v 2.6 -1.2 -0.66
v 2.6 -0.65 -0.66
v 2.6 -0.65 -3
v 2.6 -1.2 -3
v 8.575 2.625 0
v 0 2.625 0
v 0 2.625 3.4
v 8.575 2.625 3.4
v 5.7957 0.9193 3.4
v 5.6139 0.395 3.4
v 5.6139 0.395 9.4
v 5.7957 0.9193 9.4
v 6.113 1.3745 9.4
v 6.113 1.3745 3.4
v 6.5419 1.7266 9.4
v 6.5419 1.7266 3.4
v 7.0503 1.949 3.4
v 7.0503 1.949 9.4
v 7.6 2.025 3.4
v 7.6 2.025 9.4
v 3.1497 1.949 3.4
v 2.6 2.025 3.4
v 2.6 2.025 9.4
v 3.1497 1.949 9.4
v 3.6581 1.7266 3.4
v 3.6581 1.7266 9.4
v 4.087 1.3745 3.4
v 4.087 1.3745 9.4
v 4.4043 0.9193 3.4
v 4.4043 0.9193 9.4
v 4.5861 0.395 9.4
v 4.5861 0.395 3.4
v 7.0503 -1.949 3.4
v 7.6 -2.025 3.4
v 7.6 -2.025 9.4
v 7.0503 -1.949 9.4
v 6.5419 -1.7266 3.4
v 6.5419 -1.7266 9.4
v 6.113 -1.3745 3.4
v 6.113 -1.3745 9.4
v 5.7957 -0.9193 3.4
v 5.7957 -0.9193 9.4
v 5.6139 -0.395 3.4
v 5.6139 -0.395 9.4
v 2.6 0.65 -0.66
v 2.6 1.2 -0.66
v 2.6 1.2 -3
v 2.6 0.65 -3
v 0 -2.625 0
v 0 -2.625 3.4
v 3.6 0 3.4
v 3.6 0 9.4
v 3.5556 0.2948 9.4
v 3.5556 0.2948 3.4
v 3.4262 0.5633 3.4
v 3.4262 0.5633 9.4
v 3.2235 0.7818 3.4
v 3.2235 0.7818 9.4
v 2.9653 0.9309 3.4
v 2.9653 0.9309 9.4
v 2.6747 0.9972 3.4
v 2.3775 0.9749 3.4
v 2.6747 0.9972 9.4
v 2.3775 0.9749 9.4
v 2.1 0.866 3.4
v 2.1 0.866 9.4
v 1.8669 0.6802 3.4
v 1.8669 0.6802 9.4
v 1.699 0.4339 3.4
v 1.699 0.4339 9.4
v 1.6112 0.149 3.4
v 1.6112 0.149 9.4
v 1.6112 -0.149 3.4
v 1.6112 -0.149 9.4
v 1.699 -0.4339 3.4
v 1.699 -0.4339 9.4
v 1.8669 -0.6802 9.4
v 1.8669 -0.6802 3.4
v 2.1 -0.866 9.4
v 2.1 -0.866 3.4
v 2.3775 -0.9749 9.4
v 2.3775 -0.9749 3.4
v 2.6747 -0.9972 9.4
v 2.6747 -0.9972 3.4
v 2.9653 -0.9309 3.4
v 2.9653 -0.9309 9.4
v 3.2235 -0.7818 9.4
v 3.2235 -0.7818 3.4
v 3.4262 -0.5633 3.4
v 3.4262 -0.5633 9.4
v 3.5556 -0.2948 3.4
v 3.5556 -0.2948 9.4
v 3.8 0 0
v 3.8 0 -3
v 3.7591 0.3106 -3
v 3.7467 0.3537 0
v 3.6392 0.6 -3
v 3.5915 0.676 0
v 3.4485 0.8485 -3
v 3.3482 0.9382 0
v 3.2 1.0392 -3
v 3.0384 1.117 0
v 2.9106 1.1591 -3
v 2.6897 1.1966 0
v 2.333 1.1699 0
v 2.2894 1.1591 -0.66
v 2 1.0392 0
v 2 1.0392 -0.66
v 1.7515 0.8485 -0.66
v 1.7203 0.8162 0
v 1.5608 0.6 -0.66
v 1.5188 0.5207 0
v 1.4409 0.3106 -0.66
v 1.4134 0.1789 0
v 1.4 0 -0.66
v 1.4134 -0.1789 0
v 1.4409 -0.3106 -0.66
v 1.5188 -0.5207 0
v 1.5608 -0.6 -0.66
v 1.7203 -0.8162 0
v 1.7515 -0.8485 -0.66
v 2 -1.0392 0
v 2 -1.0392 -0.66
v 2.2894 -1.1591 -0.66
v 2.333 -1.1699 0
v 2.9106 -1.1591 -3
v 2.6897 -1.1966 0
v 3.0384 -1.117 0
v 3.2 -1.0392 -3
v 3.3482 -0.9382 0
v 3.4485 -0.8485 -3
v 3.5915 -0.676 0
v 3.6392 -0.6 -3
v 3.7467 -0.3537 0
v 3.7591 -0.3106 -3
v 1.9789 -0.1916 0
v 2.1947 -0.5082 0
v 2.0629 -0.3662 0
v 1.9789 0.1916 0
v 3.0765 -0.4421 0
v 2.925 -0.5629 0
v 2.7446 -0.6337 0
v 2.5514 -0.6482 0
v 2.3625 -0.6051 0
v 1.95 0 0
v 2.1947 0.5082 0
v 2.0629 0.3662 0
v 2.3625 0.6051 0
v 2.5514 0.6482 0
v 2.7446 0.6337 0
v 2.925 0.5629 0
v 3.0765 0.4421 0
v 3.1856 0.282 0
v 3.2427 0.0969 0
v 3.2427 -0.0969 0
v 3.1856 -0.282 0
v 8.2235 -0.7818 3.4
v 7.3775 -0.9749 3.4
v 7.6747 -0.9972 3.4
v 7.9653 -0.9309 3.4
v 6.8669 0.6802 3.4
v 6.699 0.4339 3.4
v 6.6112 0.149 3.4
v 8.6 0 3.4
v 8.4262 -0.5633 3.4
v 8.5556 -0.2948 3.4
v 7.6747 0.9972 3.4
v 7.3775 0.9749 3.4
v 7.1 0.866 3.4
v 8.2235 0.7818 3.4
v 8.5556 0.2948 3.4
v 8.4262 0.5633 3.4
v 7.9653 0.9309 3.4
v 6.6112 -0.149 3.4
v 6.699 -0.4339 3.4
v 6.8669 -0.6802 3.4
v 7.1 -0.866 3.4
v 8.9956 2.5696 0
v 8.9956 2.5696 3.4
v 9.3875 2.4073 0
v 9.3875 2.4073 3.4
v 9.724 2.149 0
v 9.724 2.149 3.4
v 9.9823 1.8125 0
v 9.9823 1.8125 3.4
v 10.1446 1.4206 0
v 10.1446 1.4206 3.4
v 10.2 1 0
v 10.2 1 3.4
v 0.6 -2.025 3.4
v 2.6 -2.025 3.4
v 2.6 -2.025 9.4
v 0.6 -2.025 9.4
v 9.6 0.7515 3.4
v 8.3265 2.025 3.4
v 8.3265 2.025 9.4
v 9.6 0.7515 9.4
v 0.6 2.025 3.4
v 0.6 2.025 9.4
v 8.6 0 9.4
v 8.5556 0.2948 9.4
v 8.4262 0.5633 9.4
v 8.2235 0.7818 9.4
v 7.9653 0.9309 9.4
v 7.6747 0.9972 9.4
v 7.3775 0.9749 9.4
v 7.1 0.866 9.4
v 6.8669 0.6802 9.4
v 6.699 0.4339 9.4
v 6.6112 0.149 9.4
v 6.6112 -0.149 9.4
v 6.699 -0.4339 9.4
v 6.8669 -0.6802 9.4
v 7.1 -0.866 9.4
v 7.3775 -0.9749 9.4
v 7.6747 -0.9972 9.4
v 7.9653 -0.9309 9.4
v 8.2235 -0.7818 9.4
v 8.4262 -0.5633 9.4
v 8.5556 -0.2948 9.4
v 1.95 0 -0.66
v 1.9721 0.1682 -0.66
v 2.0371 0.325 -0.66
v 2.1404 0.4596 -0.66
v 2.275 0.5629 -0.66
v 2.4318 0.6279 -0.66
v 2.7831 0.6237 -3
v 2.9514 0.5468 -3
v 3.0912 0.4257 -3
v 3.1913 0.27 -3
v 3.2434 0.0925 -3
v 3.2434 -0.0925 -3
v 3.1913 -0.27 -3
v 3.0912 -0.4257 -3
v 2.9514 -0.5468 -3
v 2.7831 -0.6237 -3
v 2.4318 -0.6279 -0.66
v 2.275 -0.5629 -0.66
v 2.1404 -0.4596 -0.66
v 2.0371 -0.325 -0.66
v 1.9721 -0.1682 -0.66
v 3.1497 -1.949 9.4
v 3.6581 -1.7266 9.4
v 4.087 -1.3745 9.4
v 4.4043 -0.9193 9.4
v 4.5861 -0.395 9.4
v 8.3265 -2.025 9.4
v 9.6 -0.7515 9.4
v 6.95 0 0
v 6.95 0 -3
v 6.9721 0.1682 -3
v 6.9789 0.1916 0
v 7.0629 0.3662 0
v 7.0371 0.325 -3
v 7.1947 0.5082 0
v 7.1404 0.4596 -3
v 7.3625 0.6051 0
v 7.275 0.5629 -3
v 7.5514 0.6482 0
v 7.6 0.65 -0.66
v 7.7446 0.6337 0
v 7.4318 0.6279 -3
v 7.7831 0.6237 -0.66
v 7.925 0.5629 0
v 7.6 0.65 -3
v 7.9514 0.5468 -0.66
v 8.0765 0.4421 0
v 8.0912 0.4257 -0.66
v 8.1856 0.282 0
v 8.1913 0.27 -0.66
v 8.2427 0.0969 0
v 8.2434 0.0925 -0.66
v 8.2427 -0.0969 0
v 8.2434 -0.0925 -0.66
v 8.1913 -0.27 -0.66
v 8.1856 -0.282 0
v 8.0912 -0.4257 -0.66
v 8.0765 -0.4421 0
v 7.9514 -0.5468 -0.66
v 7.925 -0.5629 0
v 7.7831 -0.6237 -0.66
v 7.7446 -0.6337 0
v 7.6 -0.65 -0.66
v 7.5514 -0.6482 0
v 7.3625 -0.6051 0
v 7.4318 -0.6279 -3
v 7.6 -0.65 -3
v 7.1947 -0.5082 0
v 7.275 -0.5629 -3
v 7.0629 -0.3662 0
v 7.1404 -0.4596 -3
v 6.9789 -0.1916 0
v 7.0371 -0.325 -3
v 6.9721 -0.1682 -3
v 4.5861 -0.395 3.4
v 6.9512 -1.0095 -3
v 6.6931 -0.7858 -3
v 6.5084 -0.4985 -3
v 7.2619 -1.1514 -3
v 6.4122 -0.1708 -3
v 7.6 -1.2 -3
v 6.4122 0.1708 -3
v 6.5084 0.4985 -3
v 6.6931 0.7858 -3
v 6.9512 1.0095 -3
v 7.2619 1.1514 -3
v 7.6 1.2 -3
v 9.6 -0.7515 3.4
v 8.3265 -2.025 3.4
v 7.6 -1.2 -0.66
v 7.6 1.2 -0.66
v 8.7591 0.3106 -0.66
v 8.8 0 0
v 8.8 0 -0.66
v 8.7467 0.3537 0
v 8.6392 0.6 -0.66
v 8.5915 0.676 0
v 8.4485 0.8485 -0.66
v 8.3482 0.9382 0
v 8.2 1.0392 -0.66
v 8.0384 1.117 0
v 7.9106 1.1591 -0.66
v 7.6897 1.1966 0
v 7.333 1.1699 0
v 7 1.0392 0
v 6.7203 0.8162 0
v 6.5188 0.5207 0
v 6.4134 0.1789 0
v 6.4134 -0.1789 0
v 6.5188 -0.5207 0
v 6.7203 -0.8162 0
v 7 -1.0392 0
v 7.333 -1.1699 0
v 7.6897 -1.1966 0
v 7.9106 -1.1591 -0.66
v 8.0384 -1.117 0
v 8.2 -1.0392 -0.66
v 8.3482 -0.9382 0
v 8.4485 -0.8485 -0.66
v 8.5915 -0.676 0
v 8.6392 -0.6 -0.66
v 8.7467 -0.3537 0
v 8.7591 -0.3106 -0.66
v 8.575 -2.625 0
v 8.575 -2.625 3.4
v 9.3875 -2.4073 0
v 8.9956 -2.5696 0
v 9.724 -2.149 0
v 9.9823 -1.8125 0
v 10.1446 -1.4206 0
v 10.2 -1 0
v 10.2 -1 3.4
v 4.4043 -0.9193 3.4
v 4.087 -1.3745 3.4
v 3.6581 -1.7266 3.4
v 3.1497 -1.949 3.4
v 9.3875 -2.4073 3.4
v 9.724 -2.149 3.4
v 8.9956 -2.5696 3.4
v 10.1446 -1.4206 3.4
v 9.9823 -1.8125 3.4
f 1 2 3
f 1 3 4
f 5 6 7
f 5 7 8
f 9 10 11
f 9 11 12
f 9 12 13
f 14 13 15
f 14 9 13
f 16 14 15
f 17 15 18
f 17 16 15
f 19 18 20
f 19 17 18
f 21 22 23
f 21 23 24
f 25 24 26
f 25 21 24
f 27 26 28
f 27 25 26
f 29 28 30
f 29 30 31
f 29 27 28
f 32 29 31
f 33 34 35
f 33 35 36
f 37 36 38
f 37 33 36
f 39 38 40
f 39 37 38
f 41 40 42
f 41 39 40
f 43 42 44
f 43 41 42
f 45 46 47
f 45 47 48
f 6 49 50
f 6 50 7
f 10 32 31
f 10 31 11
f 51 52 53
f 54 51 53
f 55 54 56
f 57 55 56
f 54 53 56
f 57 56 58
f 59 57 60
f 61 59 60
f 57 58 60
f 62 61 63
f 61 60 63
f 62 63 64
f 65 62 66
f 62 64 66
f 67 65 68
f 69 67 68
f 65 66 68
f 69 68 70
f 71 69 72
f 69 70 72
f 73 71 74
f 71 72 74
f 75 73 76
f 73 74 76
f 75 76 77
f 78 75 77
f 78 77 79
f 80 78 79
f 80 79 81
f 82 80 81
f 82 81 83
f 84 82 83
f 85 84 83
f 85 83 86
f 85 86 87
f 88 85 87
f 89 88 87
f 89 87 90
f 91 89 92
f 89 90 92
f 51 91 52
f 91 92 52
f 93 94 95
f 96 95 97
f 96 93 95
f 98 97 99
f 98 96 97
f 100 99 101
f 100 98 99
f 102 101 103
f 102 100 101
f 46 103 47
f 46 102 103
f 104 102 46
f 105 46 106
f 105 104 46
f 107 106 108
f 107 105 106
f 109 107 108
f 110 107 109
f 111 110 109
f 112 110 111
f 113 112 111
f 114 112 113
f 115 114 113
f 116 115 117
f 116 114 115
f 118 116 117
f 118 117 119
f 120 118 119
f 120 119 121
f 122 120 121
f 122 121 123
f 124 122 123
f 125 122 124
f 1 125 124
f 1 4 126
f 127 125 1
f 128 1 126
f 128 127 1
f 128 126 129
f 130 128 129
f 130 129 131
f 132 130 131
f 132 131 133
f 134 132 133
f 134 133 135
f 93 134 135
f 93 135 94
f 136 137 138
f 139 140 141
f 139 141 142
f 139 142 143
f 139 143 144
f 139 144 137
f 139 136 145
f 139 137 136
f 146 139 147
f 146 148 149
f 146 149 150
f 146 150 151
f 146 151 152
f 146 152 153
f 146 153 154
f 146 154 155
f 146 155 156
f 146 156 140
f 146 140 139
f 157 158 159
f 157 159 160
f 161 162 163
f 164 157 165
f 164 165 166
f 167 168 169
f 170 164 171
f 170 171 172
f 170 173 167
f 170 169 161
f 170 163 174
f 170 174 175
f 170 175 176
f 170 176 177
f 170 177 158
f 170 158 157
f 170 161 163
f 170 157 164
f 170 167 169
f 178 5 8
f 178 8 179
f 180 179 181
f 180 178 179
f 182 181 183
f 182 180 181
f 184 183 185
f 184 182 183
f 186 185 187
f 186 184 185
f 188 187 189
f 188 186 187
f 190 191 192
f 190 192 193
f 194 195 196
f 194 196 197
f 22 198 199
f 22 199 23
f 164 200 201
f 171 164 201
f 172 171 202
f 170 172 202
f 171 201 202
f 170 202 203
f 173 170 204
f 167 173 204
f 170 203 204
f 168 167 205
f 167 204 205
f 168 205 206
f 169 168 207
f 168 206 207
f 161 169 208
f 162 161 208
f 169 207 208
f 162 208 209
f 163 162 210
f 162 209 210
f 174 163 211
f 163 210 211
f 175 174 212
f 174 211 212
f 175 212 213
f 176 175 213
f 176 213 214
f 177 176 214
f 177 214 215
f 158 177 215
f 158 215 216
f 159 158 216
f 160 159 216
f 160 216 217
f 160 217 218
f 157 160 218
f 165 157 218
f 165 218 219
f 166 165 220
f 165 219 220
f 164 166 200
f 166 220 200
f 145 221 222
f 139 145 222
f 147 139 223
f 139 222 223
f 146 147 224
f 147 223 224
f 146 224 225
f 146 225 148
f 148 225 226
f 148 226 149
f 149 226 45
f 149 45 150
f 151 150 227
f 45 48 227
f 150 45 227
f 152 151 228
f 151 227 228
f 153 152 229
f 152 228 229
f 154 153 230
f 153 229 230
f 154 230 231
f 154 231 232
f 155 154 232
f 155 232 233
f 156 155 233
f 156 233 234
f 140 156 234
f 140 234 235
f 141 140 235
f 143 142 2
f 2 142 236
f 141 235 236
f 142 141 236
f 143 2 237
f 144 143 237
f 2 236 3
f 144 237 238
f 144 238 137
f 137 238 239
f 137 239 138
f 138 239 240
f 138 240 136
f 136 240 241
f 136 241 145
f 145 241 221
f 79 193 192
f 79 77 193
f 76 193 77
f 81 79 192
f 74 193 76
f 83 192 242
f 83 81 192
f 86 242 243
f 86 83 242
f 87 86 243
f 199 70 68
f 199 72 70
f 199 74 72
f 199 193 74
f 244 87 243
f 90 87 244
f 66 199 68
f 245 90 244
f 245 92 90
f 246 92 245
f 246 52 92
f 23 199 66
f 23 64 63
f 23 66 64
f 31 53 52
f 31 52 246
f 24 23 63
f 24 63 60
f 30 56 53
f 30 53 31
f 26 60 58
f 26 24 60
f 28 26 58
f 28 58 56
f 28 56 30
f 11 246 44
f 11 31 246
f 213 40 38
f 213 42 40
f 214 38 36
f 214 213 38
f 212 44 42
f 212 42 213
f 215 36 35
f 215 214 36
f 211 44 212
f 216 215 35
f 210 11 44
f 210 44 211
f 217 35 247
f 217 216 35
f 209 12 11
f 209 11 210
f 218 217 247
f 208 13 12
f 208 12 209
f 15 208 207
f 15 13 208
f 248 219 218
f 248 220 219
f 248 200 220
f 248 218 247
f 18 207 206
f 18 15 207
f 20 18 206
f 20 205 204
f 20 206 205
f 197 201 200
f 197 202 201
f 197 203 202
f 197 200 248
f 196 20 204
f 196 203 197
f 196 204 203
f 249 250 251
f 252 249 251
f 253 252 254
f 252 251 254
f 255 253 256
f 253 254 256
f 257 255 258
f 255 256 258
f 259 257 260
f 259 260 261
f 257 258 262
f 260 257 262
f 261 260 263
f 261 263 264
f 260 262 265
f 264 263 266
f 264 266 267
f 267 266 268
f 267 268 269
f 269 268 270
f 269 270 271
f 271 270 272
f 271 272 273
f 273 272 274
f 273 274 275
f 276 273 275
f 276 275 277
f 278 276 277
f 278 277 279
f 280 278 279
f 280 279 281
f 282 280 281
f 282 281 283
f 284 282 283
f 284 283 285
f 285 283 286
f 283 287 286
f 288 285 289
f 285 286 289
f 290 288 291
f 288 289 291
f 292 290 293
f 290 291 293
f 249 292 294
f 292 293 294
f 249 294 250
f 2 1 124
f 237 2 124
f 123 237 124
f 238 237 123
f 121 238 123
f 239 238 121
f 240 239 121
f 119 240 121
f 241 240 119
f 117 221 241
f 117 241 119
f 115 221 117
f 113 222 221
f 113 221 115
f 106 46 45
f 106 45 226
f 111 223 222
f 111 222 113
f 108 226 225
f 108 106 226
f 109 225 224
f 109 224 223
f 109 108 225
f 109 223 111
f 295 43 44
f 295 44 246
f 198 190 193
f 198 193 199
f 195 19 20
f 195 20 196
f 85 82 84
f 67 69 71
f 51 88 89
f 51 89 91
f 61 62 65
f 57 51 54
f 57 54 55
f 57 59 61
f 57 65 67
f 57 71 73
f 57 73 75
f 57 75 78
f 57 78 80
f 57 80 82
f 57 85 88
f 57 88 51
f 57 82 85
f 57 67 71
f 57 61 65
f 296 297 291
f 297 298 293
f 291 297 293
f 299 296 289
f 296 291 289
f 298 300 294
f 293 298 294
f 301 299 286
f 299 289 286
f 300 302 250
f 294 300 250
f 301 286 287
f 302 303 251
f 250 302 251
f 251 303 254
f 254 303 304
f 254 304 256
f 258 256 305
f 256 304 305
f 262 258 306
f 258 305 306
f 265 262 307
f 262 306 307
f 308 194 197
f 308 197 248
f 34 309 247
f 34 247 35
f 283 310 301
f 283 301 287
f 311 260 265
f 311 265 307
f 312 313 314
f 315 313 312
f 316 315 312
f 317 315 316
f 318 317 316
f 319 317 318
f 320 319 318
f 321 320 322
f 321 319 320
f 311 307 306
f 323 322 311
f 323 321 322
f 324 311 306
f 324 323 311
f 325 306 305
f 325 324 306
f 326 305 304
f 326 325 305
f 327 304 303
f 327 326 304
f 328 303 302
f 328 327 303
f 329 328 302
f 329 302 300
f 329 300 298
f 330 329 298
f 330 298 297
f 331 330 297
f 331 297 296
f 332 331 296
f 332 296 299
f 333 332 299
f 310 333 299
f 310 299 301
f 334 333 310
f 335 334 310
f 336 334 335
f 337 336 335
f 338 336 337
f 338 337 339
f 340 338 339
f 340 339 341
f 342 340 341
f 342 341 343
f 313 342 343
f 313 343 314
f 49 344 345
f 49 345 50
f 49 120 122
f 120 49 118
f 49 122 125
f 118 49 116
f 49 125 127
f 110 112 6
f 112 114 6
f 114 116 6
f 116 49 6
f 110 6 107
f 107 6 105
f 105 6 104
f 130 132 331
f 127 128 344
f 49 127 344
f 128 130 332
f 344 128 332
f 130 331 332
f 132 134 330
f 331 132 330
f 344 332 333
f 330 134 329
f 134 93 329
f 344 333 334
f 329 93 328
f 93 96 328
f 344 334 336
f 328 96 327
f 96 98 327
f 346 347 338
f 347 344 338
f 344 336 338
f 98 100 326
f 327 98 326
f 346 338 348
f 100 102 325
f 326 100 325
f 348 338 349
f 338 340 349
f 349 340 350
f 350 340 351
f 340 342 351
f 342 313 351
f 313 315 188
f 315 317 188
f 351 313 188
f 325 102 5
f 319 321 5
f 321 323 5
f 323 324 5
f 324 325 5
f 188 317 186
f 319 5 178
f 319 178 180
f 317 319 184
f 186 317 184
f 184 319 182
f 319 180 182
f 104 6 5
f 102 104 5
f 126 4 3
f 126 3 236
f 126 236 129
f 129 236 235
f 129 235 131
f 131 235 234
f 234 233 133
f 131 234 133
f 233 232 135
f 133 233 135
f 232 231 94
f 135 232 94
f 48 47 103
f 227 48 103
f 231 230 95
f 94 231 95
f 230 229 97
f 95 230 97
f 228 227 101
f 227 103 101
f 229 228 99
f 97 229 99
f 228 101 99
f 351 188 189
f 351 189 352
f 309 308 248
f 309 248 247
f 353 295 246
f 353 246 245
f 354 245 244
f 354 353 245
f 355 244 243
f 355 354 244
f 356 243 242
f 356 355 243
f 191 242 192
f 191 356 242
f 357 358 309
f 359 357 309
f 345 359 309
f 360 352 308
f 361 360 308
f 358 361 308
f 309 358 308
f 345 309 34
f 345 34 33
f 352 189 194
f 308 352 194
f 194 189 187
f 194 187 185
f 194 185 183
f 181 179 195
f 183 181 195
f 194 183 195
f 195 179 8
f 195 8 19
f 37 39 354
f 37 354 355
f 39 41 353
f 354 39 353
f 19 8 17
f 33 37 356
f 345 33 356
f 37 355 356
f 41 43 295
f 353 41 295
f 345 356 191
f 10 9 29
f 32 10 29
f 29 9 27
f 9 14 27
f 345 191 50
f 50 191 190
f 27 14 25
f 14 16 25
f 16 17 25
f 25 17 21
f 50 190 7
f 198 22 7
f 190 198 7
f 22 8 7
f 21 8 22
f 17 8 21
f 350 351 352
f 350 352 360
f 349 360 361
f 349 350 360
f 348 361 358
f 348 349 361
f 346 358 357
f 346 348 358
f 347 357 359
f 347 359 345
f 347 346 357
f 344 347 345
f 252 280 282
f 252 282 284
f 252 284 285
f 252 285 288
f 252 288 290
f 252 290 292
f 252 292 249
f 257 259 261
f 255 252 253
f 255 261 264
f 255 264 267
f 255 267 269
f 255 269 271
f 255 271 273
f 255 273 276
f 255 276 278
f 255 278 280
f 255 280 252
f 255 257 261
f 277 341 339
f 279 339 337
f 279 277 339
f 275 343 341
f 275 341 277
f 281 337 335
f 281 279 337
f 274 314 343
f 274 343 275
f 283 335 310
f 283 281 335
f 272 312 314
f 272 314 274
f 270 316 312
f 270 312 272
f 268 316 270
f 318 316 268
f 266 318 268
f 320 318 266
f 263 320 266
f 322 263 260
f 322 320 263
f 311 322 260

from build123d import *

# Parameters (mm, degrees)
SKETCH1_R           = 1
BOSS_EXTRUDE1_DEPTH = 3.4
BOSS_EXTRUDE3_DEPTH = 8.4
SKETCH5_R           = 1.2
BOSS_EXTRUDE6_DEPTH = 12.4
SKETCH6_R           = 0.65
CUT_EXTRUDE2_DEPTH  = 3
CUT_EXTRUDE3_START  = -2.34
CUT_EXTRUDE3_DEPTH  = 2.34
SKETCH8_R           = 1
CUT_EXTRUDE4_DEPTH  = 6


with BuildPart() as part:
    # Sketch1 → Boss-Extrude1 (new body)
    # profile 1 of 4: a face of its own
    with BuildSketch(Plane.XY):
        with BuildLine():
            Line((0, -2.625), (0, 2.625))
            Line((0, 2.625), (8.575, 2.625))
            ThreePointArc((8.575, 2.625), (9.724048519, 2.149048519), (10.2, 1))
            Line((10.2, 1), (10.2, -1))
            ThreePointArc((10.2, -1), (9.724048519, -2.149048519), (8.575, -2.625))
            Line((8.575, -2.625), (0, -2.625))
        make_face()
        Polygon((0.5, -2.125), (8.367893219, -2.125), (9.7, -0.792893219), (9.7, 0.792893219), (8.367893219, 2.125), (0.5, 2.125), align=None, mode=Mode.SUBTRACT)
    # profile 2 of 4: a face of its own
    with BuildSketch(Plane.XY):
        Polygon((0.5, -2.125), (0.5, 2.125), (8.367893219, 2.125), (9.7, 0.792893219), (9.7, -0.792893219), (8.367893219, -2.125), align=None)
        with Locations((2.6, 0)):
            Circle(SKETCH1_R, mode=Mode.SUBTRACT)
        with Locations((7.6, 0)):
            Circle(SKETCH1_R, mode=Mode.SUBTRACT)
    # profile 3 of 4: a face of its own
    with BuildSketch(Plane.XY):
        with Locations((7.6, 0)):
            Circle(SKETCH1_R)
    # profile 4 of 4: a face of its own
    with BuildSketch(Plane.XY):
        with Locations((2.6, 0)):
            Circle(SKETCH1_R)
    extrude(amount=BOSS_EXTRUDE1_DEPTH)

    # Sketch3 → Boss-Extrude3 (add)
    with BuildSketch(Plane(origin=(0, 0, 1), x_dir=(-1, 0, 0), z_dir=(0, 0, -1))):
        with BuildLine():
            Line((-5.613898291, -0.395), (-4.586101709, -0.395))
            ThreePointArc((-4.586101709, -0.395), (-3.884669218, -1.565327442), (-2.6, -2.025))
            Line((-2.6, -2.025), (-0.6, -2.025))
            Line((-0.6, -2.025), (-0.6, 2.025))
            Line((-0.6, 2.025), (-2.6, 2.025))
            ThreePointArc((-2.6, 2.025), (-3.884669218, 1.565327442), (-4.586101709, 0.395))
            Line((-4.586101709, 0.395), (-5.613898291, 0.395))
            ThreePointArc((-5.613898291, 0.395), (-6.315330782, 1.565327442), (-7.6, 2.025))
            Line((-7.6, 2.025), (-8.326471863, 2.025))
            Line((-8.326471863, 2.025), (-9.6, 0.751471863))
            Line((-9.6, 0.751471863), (-9.6, -0.751471863))
            Line((-9.6, -0.751471863), (-8.326471863, -2.025))
            Line((-8.326471863, -2.025), (-7.6, -2.025))
            ThreePointArc((-7.6, -2.025), (-6.315330782, -1.565327442), (-5.613898291, -0.395))
        make_face()
    extrude(amount=-BOSS_EXTRUDE3_DEPTH)

    # Sketch5 → Boss-Extrude6 (add)
    with BuildSketch(Plane.XY.offset(9.4)):
        with Locations((7.6, 0)):
            Circle(SKETCH5_R)
        with Locations((2.6, 0)):
            Circle(SKETCH5_R)
    extrude(amount=-BOSS_EXTRUDE6_DEPTH)

    # Sketch6 → Cut-Extrude2 (cut)
    with BuildSketch(Plane(origin=(0, 0, -3), x_dir=(-1, 0, 0), z_dir=(0, 0, -1))):
        with Locations((-7.6, 0)):
            Circle(SKETCH6_R)
        with Locations((-2.6, 0)):
            Circle(SKETCH6_R)
    extrude(amount=-CUT_EXTRUDE2_DEPTH, mode=Mode.SUBTRACT)

    # Sketch7 → Cut-Extrude3 (cut)
    with BuildSketch(Plane(origin=(0, 0, -3), x_dir=(-1, 0, 0), z_dir=(0, 0, -1)).offset(CUT_EXTRUDE3_START)):
        with BuildLine():
            Line((-2.6, -0.65), (-2.6, -1.2))
            ThreePointArc((-2.6, -1.2), (-1.751471863, -0.848528137), (-1.4, 0))
            ThreePointArc((-1.4, 0), (-1.751471863, 0.848528137), (-2.6, 1.2))
            Line((-2.6, 1.2), (-2.6, 0.65))
            ThreePointArc((-2.6, 0.65), (-2.140380592, 0.459619408), (-1.95, 0))
            ThreePointArc((-1.95, 0), (-2.140380592, -0.459619408), (-2.6, -0.65))
        make_face()
        with BuildLine():
            ThreePointArc((-7.6, 1.2), (-8.8, 0), (-7.6, -1.2))
            Line((-7.6, -1.2), (-7.6, 1.2))
        make_face()
    extrude(amount=CUT_EXTRUDE3_DEPTH, mode=Mode.SUBTRACT)

    # Sketch8 → Cut-Extrude4 (cut)
    with BuildSketch(Plane.XY.offset(9.4)):
        with Locations((7.6, 0)):
            Circle(SKETCH8_R)
        with Locations((2.6, 0)):
            Circle(SKETCH8_R)
    extrude(amount=-CUT_EXTRUDE4_DEPTH, mode=Mode.SUBTRACT)


solid = part.part
